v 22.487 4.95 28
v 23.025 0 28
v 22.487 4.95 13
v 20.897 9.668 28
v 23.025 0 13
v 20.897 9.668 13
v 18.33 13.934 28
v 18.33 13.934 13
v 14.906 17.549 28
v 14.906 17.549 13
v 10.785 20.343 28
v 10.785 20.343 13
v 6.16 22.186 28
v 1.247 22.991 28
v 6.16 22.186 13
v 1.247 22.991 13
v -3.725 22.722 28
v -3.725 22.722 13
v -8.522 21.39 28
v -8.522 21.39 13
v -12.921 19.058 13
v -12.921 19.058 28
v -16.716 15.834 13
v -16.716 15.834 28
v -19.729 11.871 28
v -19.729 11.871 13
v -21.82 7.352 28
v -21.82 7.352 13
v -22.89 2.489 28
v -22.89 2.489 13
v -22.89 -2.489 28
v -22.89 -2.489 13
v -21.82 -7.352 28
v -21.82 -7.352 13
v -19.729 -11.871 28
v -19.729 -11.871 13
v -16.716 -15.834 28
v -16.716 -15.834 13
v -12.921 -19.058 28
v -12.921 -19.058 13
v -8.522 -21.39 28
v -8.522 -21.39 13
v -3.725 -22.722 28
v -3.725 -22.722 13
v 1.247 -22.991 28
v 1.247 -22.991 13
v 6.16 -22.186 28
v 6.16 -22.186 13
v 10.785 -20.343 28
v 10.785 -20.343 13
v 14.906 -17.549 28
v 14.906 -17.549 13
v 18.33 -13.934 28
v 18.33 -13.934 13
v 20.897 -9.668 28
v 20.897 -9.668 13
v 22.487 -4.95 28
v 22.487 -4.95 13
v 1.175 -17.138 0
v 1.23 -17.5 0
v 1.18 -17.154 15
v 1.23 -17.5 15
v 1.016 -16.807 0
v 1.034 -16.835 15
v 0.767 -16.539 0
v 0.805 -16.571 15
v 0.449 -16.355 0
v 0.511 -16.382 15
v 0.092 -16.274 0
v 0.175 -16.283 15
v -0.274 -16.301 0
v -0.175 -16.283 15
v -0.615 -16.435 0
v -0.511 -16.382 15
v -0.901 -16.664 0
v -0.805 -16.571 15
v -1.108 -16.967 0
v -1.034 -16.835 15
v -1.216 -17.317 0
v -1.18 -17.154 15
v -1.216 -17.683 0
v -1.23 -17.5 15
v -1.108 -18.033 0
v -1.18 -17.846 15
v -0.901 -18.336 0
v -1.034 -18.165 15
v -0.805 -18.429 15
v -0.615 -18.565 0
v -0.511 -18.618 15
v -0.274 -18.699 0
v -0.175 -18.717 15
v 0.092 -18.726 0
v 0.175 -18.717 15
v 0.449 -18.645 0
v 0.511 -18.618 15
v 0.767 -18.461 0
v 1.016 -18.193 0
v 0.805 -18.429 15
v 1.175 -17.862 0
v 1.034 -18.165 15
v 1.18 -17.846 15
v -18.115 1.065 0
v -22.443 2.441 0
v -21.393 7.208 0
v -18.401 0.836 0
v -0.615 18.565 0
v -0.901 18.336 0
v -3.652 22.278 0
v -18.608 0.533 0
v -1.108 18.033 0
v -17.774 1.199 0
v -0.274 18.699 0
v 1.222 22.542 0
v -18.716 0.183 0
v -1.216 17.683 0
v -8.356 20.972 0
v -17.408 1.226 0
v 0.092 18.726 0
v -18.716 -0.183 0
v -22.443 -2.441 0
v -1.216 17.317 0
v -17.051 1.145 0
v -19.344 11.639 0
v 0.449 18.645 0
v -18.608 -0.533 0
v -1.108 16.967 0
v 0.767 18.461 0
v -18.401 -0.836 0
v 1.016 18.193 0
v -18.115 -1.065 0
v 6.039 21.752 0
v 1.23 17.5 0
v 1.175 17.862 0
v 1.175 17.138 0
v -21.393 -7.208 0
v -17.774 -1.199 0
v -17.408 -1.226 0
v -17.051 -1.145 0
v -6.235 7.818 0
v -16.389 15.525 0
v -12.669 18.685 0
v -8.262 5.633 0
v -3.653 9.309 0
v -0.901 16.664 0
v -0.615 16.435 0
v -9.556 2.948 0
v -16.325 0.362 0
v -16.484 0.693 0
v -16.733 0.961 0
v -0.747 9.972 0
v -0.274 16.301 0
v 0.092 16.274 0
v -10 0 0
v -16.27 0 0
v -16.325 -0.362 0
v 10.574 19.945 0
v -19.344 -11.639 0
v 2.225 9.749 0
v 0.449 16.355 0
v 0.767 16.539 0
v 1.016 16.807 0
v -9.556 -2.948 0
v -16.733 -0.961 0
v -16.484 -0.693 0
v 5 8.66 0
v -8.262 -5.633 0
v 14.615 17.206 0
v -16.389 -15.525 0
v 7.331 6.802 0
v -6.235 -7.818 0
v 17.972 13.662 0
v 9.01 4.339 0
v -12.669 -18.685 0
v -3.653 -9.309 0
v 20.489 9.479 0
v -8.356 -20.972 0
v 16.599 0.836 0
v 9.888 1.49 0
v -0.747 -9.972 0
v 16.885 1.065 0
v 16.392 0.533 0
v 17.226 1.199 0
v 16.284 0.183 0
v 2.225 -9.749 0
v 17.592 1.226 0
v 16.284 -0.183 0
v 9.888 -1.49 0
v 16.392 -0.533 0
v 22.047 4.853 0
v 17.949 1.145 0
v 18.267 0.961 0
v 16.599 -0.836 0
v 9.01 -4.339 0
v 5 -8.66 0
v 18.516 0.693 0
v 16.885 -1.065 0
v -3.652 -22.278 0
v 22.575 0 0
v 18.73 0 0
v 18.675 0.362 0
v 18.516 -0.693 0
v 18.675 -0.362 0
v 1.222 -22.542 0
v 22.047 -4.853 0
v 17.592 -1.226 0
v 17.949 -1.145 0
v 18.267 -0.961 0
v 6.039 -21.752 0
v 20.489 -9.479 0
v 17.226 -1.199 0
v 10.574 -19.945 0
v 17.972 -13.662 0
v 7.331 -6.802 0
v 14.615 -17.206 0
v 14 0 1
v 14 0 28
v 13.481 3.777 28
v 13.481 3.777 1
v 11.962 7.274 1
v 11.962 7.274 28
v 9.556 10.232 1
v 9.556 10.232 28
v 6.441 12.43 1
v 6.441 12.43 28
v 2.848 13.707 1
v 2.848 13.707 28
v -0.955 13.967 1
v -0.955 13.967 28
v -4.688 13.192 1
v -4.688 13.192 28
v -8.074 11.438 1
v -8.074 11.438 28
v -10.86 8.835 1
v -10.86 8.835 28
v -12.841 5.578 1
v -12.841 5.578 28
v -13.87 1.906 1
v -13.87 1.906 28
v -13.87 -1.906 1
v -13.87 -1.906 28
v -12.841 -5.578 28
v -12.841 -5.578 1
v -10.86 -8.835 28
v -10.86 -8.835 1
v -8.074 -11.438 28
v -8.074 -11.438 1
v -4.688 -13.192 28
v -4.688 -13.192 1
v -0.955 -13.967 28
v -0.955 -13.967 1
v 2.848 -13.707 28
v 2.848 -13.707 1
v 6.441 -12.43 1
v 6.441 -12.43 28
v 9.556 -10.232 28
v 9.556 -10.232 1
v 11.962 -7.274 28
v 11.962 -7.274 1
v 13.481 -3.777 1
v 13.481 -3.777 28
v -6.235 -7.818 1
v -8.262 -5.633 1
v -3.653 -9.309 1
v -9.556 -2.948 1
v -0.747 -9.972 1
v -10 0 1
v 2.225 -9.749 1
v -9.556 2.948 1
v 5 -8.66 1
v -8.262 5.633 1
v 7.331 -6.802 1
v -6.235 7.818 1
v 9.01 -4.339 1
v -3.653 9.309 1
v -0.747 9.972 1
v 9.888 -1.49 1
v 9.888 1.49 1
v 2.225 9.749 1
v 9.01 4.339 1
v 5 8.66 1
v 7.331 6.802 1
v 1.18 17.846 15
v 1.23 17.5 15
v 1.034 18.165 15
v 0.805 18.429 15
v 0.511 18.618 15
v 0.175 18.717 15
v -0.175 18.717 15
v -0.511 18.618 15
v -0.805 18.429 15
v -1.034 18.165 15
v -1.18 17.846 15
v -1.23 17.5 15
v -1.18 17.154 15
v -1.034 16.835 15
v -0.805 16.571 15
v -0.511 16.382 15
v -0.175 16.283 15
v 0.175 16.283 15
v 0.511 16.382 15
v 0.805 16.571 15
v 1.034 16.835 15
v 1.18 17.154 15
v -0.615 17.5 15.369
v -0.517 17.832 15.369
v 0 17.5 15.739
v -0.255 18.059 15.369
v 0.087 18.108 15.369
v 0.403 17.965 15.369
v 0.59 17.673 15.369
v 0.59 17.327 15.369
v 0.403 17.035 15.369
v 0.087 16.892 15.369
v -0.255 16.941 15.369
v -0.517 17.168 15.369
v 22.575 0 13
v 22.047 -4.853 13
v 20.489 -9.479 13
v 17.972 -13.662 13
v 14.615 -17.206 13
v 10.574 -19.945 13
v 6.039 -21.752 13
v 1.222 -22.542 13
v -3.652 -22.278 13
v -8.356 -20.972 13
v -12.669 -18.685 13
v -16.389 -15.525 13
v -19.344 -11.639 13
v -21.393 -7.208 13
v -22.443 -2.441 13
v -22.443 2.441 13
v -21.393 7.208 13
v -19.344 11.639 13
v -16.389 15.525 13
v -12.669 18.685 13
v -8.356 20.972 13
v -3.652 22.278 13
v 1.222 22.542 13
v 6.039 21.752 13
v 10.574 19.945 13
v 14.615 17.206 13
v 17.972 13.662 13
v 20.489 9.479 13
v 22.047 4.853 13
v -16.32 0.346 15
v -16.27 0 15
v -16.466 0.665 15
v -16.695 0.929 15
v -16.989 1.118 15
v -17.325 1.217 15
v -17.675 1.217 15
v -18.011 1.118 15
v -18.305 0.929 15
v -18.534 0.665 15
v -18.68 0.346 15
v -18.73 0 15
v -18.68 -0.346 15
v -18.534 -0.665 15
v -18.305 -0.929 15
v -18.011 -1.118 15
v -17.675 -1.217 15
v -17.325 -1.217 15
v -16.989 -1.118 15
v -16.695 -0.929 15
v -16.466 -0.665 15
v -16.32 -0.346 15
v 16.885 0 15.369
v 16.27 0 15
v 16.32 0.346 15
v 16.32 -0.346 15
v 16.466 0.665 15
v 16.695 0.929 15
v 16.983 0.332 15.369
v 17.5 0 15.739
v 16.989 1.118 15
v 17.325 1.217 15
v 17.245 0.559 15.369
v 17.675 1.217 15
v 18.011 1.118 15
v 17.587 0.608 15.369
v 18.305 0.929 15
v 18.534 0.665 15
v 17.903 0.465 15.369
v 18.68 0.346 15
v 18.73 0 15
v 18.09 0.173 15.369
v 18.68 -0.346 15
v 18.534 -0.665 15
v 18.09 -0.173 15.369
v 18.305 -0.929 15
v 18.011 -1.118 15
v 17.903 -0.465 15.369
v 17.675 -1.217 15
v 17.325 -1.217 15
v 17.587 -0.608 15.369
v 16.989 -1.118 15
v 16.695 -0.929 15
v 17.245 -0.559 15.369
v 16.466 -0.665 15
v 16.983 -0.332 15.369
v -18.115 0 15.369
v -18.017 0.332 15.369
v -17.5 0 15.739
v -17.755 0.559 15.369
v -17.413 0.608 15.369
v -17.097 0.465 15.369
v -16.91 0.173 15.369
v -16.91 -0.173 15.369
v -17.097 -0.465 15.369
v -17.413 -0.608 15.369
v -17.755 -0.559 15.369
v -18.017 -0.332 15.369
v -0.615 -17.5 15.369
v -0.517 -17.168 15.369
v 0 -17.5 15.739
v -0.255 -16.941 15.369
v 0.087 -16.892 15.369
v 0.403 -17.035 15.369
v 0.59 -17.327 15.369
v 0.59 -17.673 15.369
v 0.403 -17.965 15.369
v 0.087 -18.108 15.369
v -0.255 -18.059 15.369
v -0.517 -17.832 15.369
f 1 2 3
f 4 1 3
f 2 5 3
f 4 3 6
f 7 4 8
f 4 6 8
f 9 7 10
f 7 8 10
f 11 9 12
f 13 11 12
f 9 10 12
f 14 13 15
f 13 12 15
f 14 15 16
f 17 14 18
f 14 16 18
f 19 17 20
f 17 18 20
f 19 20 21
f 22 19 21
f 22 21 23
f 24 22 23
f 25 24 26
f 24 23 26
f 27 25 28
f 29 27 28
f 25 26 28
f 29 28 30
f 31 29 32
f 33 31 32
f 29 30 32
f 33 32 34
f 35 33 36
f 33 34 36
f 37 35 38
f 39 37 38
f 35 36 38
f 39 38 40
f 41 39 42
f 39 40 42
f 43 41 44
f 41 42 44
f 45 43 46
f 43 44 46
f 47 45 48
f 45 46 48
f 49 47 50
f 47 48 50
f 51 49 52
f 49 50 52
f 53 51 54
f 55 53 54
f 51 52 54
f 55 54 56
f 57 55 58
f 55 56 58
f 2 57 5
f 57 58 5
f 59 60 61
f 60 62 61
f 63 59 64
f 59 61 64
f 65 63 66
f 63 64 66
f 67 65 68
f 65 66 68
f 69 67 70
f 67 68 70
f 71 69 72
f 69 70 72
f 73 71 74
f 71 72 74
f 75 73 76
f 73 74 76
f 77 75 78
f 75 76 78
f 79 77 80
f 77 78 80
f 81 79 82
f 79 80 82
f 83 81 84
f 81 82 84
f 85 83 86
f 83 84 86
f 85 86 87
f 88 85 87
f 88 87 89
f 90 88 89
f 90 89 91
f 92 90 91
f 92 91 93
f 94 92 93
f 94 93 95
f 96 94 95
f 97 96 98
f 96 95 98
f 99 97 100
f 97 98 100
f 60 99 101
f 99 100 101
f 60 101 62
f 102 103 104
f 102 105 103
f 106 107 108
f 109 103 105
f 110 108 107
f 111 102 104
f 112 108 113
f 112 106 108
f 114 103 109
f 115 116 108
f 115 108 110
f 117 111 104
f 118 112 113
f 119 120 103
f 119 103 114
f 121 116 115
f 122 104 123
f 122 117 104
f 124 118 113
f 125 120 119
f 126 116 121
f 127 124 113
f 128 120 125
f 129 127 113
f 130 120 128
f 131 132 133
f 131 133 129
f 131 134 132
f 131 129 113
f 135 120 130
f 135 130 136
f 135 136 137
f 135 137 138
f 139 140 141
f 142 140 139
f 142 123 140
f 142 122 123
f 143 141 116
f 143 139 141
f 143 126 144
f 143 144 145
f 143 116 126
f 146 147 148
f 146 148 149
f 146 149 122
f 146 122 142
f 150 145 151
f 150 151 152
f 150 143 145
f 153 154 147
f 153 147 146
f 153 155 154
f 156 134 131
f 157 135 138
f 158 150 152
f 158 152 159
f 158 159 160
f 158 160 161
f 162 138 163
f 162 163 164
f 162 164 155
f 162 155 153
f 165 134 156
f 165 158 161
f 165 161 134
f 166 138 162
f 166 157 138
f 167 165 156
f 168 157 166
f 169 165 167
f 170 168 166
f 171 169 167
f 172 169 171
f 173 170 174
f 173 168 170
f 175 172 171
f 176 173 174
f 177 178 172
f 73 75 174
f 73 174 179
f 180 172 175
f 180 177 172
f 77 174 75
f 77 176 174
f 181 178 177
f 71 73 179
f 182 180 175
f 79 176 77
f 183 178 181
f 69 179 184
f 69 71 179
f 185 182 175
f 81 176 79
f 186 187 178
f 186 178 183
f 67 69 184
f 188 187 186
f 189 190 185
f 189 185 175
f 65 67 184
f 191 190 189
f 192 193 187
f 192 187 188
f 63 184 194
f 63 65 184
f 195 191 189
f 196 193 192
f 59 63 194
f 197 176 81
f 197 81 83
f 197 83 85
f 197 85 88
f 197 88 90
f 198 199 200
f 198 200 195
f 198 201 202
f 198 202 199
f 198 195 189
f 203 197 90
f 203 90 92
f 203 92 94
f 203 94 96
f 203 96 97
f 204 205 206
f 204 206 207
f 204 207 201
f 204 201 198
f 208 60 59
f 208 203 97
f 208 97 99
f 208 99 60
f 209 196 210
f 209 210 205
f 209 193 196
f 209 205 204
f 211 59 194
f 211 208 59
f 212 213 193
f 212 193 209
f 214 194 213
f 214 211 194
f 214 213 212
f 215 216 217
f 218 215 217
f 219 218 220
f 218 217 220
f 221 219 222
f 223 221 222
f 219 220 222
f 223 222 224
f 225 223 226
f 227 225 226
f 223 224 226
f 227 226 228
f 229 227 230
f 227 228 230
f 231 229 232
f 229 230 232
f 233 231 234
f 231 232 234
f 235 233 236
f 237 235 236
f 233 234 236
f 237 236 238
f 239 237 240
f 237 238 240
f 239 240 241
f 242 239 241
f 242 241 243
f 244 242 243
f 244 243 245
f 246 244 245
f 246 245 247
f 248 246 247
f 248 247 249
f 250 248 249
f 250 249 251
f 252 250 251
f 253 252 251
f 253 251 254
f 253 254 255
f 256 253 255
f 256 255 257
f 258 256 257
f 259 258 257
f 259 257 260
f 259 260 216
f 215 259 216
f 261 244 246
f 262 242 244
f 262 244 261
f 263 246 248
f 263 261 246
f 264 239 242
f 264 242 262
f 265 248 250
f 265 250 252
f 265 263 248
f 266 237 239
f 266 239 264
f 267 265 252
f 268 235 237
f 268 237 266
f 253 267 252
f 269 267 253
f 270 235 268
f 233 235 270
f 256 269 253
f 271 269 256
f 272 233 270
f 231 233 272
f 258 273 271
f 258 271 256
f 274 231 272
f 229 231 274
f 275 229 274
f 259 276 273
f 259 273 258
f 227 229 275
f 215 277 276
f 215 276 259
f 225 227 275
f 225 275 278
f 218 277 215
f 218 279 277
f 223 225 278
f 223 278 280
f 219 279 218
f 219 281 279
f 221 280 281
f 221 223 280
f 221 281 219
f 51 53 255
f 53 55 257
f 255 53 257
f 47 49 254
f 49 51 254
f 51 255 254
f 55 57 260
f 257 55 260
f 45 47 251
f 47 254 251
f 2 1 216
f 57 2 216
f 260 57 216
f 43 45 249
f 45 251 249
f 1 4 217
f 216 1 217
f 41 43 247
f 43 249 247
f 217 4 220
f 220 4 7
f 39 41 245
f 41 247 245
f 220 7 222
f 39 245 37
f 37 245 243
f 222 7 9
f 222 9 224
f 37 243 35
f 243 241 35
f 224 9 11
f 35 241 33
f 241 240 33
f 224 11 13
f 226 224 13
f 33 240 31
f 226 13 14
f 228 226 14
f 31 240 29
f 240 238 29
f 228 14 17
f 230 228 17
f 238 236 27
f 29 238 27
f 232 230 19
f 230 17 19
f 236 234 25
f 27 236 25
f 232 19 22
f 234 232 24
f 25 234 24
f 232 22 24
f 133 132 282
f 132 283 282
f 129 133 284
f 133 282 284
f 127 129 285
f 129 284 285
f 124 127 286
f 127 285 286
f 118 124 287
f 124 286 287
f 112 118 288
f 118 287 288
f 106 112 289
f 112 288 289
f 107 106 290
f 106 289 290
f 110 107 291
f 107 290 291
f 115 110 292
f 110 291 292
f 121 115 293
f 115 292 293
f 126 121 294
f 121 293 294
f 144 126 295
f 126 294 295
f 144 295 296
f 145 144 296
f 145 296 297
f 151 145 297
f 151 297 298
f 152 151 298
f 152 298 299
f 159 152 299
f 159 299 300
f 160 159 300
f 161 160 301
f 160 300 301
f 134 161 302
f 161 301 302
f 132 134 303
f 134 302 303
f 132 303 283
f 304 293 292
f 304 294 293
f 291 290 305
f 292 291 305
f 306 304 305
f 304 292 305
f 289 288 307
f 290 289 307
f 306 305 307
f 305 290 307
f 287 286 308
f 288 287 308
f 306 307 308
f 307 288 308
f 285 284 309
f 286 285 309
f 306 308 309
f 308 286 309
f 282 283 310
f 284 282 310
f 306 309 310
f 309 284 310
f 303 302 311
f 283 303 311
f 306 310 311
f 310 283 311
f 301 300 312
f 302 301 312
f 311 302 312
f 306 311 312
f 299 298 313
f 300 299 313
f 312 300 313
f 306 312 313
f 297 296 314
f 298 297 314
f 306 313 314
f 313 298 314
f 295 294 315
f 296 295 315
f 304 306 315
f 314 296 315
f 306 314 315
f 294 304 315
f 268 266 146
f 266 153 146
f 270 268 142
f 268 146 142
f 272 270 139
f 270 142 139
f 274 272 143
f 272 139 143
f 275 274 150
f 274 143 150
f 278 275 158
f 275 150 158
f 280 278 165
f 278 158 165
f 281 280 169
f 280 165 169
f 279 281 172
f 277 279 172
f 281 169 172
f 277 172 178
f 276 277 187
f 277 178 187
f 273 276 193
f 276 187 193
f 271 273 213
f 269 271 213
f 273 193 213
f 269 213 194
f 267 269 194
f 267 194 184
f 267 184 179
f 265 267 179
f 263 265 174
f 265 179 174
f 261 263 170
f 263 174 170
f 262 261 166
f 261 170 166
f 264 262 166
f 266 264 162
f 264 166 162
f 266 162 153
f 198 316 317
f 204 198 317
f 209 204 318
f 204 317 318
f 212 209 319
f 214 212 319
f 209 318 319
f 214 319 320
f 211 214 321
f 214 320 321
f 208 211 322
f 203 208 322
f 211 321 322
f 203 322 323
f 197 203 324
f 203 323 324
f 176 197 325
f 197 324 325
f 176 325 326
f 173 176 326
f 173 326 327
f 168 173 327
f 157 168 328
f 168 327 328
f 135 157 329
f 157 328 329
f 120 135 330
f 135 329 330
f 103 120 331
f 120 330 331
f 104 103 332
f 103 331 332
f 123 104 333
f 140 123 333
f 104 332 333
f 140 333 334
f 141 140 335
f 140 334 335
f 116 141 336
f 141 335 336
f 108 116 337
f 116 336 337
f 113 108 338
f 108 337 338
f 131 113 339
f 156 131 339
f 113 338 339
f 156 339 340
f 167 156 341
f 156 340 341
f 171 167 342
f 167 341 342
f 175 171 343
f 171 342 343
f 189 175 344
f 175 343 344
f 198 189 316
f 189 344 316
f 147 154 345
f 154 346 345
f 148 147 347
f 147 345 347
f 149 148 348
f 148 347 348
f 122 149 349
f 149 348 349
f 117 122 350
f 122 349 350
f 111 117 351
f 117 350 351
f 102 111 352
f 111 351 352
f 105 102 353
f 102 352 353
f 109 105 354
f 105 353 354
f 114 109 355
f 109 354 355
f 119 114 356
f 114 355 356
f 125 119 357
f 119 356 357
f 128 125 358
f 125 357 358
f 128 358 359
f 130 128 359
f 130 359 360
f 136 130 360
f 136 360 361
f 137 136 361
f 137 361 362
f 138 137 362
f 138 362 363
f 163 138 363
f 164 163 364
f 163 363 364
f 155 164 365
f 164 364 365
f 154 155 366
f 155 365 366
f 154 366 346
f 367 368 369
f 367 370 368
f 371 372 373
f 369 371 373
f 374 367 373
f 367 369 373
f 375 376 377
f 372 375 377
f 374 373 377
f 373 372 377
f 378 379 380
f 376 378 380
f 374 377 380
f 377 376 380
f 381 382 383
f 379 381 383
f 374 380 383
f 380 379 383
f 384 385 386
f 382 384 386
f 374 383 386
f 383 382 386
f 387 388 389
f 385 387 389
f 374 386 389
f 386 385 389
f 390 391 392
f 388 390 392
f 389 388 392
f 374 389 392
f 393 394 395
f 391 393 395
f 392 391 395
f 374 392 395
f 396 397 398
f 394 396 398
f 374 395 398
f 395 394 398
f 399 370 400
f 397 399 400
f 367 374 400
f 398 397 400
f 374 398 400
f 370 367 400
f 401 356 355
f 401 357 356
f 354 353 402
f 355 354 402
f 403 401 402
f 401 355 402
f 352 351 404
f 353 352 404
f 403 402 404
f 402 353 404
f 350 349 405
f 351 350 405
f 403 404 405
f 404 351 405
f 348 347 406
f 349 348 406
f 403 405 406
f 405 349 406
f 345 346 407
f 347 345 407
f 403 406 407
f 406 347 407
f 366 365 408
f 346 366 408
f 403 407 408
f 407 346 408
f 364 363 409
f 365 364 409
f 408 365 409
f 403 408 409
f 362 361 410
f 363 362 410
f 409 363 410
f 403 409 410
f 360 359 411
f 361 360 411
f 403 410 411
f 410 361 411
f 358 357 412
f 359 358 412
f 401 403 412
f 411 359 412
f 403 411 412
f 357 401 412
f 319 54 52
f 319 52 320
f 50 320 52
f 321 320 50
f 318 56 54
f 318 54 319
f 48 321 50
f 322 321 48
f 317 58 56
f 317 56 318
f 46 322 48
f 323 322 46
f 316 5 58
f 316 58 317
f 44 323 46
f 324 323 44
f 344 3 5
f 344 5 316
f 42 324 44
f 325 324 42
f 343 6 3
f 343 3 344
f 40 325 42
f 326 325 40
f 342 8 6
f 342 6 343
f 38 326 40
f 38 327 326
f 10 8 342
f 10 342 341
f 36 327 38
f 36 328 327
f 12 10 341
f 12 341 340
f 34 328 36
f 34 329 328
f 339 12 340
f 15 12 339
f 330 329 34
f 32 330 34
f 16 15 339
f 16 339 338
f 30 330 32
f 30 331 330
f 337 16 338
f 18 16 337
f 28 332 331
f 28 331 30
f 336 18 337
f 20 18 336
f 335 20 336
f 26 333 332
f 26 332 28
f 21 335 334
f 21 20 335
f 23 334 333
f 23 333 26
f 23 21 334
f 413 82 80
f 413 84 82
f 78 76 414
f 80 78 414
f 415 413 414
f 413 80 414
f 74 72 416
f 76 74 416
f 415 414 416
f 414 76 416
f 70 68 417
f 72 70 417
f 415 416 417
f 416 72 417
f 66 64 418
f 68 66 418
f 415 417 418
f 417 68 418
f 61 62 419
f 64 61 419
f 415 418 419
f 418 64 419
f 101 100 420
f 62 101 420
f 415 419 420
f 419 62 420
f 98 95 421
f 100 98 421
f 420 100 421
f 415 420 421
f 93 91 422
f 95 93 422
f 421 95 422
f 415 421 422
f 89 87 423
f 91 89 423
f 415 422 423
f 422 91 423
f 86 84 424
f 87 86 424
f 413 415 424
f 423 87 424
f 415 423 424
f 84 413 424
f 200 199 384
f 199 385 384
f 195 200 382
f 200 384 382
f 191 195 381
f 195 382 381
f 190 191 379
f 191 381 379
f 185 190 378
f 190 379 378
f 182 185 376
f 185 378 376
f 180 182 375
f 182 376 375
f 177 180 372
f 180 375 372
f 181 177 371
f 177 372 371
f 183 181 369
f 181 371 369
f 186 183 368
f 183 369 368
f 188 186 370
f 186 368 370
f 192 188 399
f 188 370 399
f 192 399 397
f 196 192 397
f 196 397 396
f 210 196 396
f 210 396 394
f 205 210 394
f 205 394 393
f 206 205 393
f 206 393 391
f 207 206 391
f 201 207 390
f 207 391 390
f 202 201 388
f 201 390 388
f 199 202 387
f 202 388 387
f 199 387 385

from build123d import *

# Parameters (mm, degrees)
SKETCH1_W                = 23.025
SKETCH1_H                = 15
SKETCH2_R                = 22.575
BOSS_EXTRUDE1_DEPTH      = 13
HOLE1_D                  = 20
HOLE1_CBORE_D            = 28
HOLE1_CBORE_DEPTH        = 27
M2_CLEARANCE_HOLE1_D     = 2.459
M2_CLEARANCE_HOLE1_DEPTH = 14.999999999
M2_CLEARANCE_HOLE1_TIP   = 0.738758131


with BuildPart() as part:
    # Sketch1 → Revolve1 (revolve)
    with BuildSketch(Plane(origin=(0, 0, 0), x_dir=(1, 0, 0), z_dir=(0, 1, 0))):
        with Locations((11.5125, -20.5)):
            Rectangle(SKETCH1_W, SKETCH1_H)
    revolve(axis=Axis((0, 0, 13), (0, 0, 1)))

    # Sketch2 → Boss-Extrude1 (add)
    with BuildSketch(Plane(origin=(0, 0, 13), x_dir=(-1, 0, 0), z_dir=(0, 0, -1))):
        with Locations(Location((0, 0, 0), (0, 0, 180))):
            Circle(SKETCH2_R)
    extrude(amount=BOSS_EXTRUDE1_DEPTH)

    # Hole1 (through all)
    with Locations(Plane.XY.offset(28)):
        with Locations((0, 0)):
            CounterBoreHole(HOLE1_D / 2, HOLE1_CBORE_D / 2, HOLE1_CBORE_DEPTH)

    # M2 Clearance Hole1
    with Locations(Plane(origin=(0, 0, 0), x_dir=(-1, 0, 0), z_dir=(0, 0, -1))):
        with Locations((0, 17.5), (-17.5, 0), (0, -17.5), (17.5, 0)):
            Hole(M2_CLEARANCE_HOLE1_D / 2, depth=M2_CLEARANCE_HOLE1_DEPTH)
            with Locations((0, 0, -(M2_CLEARANCE_HOLE1_DEPTH + M2_CLEARANCE_HOLE1_TIP / 2))):  # 118° drill point
                Cone(0, M2_CLEARANCE_HOLE1_D / 2, M2_CLEARANCE_HOLE1_TIP, mode=Mode.SUBTRACT)


solid = part.part
